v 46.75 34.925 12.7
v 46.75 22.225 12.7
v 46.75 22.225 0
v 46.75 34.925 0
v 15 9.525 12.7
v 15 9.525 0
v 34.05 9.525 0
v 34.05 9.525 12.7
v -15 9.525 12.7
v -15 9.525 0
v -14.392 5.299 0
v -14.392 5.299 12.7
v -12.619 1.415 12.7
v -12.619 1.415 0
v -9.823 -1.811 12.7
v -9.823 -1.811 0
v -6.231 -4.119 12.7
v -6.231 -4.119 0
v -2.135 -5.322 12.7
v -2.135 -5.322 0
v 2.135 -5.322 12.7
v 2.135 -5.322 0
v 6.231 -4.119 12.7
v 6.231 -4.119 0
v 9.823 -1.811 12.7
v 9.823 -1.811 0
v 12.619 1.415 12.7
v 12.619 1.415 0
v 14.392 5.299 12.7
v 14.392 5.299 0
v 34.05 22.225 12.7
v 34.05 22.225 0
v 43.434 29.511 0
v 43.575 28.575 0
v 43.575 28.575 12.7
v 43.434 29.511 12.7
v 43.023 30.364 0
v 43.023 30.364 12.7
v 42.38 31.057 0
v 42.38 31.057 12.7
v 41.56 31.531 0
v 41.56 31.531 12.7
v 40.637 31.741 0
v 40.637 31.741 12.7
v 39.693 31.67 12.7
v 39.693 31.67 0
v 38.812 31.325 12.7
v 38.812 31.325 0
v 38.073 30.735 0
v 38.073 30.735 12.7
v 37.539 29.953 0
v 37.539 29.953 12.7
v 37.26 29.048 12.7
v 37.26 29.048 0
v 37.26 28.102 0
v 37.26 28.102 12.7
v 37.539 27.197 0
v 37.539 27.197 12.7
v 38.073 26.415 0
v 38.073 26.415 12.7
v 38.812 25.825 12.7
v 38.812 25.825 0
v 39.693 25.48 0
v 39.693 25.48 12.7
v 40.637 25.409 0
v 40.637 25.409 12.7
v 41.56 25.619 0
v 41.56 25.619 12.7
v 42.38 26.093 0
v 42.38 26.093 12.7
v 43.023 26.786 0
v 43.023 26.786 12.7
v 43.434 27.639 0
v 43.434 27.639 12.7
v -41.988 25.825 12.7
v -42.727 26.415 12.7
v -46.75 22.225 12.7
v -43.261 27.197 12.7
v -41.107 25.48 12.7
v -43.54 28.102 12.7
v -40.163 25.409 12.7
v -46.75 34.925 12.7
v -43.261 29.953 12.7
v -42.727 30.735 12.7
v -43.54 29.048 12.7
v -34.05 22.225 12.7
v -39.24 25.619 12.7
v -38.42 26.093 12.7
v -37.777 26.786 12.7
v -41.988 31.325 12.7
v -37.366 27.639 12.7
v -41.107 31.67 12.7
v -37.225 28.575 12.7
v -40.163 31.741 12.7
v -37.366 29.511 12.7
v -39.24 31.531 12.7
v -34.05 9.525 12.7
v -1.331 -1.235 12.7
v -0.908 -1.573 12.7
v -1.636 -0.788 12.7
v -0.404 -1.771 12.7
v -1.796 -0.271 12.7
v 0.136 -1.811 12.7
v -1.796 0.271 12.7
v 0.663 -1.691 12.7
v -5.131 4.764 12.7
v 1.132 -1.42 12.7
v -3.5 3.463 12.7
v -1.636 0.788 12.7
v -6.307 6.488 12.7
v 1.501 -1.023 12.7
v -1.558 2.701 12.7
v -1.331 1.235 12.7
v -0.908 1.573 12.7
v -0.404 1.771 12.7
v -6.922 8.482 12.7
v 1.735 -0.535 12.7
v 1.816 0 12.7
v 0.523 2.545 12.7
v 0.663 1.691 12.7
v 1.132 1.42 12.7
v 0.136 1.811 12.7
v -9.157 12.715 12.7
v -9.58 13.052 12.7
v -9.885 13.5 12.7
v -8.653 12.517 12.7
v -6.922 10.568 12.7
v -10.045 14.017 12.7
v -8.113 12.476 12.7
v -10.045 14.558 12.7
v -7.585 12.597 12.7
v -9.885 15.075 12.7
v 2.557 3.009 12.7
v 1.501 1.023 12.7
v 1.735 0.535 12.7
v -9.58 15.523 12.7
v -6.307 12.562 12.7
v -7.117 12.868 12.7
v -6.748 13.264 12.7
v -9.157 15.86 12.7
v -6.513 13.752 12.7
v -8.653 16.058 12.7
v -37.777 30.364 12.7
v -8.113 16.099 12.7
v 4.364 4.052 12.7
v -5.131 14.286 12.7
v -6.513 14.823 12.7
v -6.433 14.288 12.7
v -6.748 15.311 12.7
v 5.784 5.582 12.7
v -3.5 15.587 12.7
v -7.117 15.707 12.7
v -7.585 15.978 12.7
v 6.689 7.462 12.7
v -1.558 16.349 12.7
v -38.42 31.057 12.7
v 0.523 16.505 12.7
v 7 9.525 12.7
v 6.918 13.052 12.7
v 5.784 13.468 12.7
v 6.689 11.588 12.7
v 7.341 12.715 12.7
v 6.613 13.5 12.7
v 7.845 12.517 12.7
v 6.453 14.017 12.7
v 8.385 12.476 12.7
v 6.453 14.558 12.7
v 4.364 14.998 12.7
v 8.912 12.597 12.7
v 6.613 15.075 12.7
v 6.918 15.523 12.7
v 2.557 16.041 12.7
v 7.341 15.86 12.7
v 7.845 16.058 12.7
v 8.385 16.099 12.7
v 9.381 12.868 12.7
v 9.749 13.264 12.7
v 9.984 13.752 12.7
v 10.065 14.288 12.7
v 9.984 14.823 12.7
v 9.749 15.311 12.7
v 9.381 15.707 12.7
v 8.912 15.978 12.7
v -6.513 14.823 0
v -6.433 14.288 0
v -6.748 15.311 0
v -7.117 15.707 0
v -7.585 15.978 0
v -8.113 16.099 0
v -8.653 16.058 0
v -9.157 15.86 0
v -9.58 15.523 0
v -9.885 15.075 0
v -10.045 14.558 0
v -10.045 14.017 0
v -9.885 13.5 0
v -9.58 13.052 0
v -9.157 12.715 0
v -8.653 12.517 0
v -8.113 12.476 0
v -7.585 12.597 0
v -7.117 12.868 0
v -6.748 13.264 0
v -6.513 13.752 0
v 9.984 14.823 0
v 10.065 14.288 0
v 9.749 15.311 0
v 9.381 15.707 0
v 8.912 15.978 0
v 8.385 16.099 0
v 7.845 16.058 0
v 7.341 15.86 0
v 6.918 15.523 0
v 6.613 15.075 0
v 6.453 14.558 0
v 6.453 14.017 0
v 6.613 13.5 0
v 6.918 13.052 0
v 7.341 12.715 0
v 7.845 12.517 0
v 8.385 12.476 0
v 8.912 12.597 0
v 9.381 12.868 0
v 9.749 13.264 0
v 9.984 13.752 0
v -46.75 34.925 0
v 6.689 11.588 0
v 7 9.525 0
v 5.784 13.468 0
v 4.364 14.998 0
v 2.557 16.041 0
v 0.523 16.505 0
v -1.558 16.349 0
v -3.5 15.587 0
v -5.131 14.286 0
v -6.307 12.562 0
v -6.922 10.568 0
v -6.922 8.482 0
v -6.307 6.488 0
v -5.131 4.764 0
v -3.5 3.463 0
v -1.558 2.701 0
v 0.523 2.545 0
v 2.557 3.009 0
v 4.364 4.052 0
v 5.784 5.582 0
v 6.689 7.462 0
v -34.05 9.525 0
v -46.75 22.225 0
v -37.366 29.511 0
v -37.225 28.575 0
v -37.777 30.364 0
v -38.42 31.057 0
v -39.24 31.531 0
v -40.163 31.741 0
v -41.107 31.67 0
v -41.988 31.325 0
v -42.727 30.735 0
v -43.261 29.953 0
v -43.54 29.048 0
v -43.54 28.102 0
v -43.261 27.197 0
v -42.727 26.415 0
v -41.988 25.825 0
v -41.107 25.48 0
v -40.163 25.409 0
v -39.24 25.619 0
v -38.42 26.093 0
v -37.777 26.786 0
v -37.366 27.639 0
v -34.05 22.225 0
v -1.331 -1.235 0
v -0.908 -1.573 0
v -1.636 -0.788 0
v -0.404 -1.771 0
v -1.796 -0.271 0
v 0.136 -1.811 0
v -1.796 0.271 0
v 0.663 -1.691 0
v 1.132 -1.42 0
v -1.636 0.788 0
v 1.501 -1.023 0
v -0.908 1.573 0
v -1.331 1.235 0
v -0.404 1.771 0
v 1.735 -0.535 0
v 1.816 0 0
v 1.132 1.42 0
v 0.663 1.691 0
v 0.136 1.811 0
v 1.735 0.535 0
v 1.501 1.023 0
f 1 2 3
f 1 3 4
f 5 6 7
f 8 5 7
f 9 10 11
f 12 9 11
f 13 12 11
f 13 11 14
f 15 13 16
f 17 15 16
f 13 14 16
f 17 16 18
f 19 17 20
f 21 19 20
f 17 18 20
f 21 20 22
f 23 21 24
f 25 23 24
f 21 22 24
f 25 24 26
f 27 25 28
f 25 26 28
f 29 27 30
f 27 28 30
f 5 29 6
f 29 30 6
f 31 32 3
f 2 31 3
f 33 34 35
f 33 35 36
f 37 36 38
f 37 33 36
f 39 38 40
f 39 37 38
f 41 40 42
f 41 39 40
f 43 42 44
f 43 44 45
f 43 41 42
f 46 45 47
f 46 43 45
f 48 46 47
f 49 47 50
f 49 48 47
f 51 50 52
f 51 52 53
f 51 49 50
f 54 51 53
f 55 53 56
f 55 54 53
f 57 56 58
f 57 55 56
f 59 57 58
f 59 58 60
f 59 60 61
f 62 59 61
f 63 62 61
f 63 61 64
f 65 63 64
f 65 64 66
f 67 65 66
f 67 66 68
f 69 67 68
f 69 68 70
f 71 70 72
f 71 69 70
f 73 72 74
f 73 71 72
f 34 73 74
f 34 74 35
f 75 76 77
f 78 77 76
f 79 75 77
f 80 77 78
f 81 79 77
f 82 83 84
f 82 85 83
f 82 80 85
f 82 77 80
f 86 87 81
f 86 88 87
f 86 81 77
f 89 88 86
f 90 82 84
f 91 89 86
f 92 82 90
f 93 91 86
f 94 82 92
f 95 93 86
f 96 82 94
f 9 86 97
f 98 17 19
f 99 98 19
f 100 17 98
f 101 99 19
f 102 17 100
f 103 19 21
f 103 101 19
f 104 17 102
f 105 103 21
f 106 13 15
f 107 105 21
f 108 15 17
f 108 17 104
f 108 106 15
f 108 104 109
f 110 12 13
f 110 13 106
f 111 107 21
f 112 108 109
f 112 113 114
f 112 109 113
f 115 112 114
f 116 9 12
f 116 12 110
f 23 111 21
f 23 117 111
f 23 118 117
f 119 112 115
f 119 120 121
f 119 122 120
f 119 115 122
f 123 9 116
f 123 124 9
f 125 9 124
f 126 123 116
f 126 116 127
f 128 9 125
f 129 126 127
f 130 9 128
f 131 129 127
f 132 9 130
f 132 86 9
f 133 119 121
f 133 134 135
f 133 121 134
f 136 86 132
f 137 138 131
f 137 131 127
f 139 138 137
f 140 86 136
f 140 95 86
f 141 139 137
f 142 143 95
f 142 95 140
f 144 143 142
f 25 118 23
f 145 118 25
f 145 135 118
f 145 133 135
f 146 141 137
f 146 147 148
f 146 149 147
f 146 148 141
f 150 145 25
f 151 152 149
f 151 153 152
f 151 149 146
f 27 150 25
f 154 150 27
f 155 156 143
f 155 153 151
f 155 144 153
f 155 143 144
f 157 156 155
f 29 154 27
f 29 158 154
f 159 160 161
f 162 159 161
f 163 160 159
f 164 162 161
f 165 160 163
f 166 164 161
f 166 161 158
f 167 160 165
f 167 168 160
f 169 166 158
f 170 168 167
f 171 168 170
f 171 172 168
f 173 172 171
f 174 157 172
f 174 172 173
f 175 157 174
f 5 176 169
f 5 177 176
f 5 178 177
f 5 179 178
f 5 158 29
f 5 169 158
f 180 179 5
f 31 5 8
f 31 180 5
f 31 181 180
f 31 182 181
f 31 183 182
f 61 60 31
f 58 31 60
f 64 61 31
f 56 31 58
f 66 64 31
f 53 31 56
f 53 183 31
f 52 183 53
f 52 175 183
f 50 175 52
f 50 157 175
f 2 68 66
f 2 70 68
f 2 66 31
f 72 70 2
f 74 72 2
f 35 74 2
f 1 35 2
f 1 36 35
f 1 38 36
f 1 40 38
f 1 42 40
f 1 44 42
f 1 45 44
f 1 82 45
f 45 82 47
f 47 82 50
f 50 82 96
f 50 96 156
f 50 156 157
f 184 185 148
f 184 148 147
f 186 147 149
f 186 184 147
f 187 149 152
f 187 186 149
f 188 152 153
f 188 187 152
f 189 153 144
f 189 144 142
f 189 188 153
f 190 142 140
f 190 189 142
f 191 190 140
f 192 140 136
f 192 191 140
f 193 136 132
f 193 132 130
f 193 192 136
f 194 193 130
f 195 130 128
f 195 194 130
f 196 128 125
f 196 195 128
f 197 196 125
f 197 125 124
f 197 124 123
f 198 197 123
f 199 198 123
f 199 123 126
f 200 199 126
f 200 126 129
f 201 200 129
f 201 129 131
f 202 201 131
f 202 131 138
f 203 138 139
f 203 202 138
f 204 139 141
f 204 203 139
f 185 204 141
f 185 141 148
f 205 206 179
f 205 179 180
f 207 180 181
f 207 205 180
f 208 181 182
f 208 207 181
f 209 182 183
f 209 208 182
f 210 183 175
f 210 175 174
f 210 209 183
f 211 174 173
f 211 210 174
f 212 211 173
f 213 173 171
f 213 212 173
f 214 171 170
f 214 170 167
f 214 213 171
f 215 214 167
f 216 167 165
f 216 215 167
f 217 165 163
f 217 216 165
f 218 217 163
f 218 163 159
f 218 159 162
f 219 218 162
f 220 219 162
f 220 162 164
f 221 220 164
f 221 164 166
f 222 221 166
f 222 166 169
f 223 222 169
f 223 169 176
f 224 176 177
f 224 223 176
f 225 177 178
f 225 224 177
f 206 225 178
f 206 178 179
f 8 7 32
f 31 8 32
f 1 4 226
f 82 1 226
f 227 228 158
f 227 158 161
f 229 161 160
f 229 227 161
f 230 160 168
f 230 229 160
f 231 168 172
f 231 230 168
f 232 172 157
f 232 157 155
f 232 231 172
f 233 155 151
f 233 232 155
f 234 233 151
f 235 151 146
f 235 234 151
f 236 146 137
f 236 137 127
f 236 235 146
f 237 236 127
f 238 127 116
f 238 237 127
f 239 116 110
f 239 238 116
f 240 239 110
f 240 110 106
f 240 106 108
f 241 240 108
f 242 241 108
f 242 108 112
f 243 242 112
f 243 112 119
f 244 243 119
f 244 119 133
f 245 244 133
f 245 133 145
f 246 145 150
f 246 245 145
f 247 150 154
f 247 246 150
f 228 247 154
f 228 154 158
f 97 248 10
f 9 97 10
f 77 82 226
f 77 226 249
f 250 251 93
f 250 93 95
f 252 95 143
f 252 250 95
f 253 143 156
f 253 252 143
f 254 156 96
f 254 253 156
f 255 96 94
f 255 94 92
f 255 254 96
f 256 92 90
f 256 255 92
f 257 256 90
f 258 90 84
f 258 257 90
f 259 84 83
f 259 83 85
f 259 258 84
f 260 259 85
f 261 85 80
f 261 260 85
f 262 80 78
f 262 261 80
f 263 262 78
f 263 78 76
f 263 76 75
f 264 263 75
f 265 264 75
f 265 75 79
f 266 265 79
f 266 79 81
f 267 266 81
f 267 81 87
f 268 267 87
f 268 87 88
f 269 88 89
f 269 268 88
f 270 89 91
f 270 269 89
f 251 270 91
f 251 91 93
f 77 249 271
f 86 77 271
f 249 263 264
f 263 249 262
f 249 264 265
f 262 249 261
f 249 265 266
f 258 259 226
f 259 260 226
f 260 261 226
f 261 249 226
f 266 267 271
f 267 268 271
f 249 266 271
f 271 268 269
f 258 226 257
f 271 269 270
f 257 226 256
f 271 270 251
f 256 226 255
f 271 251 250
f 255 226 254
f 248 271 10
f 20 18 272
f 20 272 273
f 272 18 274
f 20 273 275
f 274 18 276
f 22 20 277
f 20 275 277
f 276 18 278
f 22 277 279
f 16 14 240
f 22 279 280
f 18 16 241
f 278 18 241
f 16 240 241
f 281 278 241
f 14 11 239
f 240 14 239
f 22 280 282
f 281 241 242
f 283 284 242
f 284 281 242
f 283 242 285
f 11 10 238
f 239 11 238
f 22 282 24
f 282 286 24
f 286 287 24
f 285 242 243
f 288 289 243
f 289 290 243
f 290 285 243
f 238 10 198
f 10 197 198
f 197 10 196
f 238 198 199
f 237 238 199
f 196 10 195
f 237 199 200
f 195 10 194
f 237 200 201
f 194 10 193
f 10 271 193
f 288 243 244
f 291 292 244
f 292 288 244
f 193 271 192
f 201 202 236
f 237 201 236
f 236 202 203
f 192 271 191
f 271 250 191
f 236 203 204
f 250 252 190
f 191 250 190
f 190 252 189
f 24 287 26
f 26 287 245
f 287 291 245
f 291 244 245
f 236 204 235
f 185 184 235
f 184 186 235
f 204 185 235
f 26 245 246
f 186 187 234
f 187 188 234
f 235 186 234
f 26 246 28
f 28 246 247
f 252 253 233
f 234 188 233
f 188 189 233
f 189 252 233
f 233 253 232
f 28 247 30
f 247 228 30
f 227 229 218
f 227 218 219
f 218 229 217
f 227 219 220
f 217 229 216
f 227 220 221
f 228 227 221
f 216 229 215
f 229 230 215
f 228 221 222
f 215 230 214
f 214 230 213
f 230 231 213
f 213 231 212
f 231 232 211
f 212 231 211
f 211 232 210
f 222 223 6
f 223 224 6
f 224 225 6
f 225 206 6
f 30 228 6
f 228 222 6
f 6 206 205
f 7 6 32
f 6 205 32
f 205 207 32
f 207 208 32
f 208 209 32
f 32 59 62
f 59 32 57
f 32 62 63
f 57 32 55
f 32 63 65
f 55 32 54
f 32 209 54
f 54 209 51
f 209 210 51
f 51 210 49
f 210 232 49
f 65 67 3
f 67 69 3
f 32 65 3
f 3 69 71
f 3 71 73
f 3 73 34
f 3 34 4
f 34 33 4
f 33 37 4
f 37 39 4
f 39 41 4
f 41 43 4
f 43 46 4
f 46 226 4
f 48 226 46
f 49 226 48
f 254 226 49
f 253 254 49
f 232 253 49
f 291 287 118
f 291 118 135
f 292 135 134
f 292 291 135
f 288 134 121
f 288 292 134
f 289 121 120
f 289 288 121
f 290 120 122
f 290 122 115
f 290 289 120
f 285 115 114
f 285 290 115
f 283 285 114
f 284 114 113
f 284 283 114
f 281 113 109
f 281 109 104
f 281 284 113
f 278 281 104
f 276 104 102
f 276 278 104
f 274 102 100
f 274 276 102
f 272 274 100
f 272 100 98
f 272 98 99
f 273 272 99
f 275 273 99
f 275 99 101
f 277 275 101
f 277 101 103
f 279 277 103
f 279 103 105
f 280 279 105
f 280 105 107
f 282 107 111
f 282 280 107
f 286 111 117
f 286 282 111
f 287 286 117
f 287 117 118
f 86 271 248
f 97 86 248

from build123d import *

# Parameters (mm, degrees)
SKETCH1_R           = 3.175
SKETCH1_R_2         = 1.8161
SKETCH1_R_3         = 7
BOSS_EXTRUDE1_DEPTH = 12.7


with BuildPart() as part:
    # Sketch1 → Boss-Extrude1 (new body)
    with BuildSketch(Plane.XY):
        with BuildLine():
            Line((-34.05, 9.525), (-15, 9.525))
            ThreePointArc((-15, 9.525), (0, -5.475), (15, 9.525))
            Line((15, 9.525), (34.05, 9.525))
            Line((34.05, 9.525), (34.05, 22.225))
            Line((34.05, 22.225), (46.75, 22.225))
            Line((46.75, 22.225), (46.75, 34.925))
            Line((46.75, 34.925), (-46.75, 34.925))
            Line((-46.75, 34.925), (-46.75, 22.225))
            Line((-46.75, 22.225), (-34.05, 22.225))
            Line((-34.05, 22.225), (-34.05, 9.525))
        make_face()
        with Locations((-40.4, 28.575)):
            Circle(SKETCH1_R, mode=Mode.SUBTRACT)
        with Locations((40.4, 28.575)):
            Circle(SKETCH1_R, mode=Mode.SUBTRACT)
        with Locations((8.248891971, 14.2875)):
            Circle(SKETCH1_R_2, mode=Mode.SUBTRACT)
        with Locations((-8.248891971, 14.2875)):
            Circle(SKETCH1_R_2, mode=Mode.SUBTRACT)
        Circle(SKETCH1_R_2, mode=Mode.SUBTRACT)
        with Locations((0, 9.525)):
            Circle(SKETCH1_R_3, mode=Mode.SUBTRACT)
    extrude(amount=BOSS_EXTRUDE1_DEPTH)


solid = part.part
